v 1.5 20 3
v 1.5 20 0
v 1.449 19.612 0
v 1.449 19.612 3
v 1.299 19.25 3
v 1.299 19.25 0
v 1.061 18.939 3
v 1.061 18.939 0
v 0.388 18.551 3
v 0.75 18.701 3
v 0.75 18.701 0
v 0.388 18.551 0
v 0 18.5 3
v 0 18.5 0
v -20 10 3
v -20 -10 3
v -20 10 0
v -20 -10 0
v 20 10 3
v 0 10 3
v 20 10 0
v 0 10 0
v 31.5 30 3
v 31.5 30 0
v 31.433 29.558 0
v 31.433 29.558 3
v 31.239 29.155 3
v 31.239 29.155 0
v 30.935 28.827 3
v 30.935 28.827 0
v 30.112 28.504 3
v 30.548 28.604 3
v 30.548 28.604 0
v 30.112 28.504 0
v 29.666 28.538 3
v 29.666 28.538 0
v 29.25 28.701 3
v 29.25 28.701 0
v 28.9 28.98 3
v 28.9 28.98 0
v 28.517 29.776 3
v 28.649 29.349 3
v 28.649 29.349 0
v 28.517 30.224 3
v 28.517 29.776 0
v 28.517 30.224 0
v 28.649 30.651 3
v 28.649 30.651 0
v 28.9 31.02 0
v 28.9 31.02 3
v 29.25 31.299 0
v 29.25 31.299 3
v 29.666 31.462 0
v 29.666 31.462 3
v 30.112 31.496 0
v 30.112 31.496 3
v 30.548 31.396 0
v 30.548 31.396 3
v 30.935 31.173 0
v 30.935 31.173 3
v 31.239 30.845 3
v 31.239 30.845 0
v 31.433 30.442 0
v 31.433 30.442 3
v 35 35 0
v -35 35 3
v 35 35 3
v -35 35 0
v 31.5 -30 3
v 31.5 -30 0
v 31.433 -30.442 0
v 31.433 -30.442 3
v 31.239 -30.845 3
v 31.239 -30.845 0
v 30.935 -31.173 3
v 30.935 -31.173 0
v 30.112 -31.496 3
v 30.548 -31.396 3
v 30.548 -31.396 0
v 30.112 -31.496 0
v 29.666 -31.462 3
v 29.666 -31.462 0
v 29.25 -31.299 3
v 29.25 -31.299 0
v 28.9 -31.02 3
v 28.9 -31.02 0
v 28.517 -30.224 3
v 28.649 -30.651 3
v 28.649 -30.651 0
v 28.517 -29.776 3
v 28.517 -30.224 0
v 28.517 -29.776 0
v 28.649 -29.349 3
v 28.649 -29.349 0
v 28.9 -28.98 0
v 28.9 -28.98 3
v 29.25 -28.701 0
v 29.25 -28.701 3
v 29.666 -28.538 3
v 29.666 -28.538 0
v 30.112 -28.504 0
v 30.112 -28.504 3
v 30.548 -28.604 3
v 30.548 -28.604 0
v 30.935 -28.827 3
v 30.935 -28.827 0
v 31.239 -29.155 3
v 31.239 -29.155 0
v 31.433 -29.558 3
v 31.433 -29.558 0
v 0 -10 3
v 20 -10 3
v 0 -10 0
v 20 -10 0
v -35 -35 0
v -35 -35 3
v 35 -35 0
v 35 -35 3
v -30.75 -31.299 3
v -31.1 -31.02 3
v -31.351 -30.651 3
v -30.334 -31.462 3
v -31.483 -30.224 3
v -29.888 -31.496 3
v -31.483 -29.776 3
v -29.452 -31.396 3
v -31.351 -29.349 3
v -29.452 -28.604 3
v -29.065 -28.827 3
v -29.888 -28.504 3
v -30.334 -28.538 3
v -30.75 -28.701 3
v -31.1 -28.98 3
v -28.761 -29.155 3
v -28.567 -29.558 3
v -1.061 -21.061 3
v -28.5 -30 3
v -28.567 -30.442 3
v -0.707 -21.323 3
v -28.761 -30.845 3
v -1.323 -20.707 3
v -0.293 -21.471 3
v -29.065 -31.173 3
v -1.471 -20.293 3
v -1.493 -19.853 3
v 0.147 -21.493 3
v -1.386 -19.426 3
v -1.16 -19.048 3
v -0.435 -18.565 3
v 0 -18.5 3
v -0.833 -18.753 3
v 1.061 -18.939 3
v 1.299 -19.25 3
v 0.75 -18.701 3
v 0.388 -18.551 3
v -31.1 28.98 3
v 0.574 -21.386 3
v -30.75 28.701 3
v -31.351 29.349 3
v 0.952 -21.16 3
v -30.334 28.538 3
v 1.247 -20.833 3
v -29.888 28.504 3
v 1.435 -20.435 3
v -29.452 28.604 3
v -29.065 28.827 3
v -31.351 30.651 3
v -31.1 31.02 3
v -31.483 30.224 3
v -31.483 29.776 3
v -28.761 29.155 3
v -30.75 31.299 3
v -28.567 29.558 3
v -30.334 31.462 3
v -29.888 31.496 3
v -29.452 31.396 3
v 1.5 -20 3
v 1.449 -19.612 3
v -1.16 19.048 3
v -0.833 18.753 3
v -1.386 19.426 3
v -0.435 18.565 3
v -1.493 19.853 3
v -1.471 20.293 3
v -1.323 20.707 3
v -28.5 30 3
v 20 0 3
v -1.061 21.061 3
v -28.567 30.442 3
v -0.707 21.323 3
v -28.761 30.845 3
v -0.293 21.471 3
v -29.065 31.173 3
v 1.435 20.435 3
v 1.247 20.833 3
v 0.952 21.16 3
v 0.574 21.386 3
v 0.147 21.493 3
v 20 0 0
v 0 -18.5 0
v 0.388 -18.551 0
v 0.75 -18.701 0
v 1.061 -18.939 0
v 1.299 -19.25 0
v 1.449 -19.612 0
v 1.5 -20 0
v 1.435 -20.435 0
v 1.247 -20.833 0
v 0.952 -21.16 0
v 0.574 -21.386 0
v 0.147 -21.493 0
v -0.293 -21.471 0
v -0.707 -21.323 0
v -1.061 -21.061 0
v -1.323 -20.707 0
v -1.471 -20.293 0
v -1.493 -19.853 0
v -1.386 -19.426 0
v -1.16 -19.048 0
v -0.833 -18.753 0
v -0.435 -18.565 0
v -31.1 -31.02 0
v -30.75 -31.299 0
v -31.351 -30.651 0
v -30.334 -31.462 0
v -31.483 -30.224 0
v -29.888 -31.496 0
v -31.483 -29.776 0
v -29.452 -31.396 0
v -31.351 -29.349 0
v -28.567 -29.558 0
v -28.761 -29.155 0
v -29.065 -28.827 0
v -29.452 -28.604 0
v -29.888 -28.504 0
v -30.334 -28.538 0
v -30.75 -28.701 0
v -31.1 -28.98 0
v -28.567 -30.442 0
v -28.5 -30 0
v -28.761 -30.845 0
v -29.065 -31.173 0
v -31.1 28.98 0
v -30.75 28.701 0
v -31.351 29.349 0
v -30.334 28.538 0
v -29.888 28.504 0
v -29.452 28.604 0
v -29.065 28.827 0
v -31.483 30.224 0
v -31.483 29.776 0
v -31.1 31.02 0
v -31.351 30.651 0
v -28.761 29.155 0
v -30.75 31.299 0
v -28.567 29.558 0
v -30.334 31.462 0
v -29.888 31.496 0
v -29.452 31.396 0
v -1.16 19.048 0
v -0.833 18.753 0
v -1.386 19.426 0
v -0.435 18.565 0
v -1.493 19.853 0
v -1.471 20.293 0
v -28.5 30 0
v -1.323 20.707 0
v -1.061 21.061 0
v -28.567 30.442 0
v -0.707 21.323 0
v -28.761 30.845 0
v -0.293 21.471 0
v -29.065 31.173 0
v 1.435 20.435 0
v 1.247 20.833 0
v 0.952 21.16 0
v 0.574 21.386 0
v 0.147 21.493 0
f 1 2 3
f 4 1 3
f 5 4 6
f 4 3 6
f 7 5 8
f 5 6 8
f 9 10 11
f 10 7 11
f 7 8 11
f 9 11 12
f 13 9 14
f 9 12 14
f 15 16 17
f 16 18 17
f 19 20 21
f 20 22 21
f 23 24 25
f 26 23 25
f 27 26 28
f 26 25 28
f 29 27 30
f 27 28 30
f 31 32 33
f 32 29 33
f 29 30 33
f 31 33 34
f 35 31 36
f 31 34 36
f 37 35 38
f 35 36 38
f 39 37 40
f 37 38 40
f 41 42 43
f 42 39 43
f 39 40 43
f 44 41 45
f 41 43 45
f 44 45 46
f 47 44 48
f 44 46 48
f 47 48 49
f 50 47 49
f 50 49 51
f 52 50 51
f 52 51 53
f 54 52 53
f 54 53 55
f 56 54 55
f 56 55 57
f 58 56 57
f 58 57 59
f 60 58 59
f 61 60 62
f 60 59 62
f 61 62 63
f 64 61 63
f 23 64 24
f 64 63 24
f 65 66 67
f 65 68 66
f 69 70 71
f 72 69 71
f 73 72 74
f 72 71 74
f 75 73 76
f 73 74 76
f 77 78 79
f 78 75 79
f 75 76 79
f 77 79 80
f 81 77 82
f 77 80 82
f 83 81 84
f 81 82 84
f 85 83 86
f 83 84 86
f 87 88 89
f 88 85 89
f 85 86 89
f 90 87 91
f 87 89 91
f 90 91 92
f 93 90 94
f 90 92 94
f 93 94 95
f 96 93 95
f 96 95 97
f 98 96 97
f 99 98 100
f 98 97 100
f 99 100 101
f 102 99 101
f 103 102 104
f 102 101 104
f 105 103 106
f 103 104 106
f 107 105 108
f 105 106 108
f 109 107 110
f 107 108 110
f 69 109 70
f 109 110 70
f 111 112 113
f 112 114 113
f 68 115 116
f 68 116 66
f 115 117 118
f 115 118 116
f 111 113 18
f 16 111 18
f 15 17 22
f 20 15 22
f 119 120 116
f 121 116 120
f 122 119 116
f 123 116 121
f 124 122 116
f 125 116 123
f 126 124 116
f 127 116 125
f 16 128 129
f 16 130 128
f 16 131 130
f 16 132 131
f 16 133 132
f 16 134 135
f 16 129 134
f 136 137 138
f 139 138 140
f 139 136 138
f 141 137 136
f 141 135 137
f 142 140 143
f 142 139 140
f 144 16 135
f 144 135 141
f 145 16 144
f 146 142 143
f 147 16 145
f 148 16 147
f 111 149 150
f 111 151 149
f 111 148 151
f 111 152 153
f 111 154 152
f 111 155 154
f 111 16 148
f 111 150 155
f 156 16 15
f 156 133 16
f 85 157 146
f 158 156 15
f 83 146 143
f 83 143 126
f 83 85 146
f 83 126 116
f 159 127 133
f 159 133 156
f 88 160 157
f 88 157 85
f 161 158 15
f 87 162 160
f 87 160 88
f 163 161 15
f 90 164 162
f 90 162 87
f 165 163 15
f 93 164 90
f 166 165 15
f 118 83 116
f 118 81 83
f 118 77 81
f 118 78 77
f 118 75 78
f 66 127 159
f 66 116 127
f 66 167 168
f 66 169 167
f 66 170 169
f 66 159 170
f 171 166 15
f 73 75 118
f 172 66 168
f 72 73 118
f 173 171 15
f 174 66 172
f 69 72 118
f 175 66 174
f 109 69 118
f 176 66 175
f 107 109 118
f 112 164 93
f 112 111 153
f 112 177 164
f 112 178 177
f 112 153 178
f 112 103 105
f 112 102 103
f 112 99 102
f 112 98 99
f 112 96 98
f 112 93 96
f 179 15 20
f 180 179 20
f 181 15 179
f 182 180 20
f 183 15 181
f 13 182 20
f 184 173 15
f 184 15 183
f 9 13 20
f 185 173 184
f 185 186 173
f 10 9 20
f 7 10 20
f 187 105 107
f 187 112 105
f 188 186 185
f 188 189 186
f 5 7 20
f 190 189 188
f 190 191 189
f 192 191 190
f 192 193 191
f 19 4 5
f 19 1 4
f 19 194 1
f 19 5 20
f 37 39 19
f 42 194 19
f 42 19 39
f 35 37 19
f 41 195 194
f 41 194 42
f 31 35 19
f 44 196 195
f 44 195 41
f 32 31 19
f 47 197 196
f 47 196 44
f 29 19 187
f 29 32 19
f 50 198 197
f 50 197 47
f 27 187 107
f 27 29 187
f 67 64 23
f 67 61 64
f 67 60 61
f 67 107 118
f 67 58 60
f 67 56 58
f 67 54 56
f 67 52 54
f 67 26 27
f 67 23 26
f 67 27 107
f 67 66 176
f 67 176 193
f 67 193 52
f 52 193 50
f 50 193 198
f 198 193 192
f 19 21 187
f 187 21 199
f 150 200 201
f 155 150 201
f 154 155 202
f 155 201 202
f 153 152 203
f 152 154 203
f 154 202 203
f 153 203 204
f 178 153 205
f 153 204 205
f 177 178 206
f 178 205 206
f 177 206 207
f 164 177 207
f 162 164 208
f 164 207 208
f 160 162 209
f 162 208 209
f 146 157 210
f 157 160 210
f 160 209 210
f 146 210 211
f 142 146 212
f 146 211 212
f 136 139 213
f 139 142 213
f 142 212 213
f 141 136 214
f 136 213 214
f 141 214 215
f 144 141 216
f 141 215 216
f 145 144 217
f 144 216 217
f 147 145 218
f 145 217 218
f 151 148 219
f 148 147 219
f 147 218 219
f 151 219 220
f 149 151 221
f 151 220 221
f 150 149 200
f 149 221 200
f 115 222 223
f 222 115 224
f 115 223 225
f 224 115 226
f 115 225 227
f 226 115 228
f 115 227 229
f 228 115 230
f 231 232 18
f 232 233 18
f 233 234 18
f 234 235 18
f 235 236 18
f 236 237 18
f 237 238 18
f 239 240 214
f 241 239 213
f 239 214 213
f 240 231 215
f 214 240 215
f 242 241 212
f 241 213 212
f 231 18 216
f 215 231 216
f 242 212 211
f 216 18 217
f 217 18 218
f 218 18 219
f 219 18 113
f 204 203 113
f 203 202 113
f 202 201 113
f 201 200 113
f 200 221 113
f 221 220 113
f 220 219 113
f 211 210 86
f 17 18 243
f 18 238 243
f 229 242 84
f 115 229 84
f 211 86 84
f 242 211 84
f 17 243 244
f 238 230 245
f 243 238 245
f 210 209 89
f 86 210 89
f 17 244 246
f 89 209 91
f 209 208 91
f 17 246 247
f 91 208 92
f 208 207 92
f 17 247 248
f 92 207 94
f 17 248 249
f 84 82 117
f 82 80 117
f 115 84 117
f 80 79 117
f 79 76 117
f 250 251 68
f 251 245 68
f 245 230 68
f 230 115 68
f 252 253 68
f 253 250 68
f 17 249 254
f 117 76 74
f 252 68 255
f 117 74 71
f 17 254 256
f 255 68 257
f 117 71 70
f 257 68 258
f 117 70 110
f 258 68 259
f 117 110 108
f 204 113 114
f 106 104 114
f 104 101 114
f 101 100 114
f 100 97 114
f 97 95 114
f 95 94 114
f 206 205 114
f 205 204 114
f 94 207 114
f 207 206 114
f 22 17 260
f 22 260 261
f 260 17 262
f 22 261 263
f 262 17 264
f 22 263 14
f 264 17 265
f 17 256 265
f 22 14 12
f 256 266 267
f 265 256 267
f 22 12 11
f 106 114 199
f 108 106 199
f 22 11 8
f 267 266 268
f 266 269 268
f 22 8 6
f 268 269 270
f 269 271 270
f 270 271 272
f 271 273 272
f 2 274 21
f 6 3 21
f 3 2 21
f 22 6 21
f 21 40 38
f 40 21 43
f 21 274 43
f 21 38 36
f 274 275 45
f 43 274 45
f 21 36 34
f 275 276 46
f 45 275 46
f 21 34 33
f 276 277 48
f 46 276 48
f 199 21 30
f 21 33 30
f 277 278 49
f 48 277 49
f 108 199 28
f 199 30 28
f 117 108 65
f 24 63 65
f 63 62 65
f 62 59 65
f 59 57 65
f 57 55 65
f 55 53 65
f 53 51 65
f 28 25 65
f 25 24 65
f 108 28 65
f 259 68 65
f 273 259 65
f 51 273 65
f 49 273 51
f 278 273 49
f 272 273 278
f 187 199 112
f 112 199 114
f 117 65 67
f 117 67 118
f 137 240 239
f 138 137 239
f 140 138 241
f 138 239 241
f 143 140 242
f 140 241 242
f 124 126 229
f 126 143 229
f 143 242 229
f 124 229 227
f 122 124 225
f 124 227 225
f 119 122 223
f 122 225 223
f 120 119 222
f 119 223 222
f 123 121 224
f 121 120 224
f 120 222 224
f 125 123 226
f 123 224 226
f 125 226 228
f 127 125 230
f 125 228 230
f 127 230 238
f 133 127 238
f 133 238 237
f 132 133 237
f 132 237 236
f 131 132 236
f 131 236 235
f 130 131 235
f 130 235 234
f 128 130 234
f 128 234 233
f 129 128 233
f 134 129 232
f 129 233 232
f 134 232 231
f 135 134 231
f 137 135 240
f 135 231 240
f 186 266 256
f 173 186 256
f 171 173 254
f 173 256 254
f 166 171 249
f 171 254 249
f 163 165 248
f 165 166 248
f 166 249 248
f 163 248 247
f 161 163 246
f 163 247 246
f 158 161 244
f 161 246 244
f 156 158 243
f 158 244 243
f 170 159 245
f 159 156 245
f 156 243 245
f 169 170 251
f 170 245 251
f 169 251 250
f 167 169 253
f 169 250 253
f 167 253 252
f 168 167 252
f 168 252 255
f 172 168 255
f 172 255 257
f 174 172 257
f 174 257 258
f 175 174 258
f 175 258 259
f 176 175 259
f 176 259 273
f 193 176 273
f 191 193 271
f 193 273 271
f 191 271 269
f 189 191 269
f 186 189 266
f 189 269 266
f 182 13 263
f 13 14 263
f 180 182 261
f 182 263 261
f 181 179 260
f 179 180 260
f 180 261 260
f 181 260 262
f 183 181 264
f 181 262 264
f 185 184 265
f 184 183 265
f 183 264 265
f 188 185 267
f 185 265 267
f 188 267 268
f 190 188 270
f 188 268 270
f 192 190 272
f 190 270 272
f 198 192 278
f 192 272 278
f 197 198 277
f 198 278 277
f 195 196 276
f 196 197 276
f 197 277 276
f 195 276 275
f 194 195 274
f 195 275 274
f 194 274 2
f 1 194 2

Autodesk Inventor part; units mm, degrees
ref_plane "YZ Plane" through (0, 0, 0) normal (1, 0, 0) x (0, 1, 0)
ref_plane "XZ Plane" through (0, 0, 0) normal (0, 1, 0) x (-1, 0, 0)
ref_plane "XY Plane" through (0, 0, 0) normal (0, 0, 1) x (1, 0, 0)
sketch "Sketch1" plane through (0, 0, 0) normal (0, 0, 1) x (1, 0, 0)
  line L0 (-20, 10) -> (20, 10)
  line L1 (20, 10) -> (20, -10)
  line L2 (20, -10) -> (-20, -10)
  line L3 (-20, -10) -> (-20, 10)
  line L4 (-20, 10) -> (20, -10) construction
  line L5 (20, 10) -> (-20, -10) construction
  line L6 (20, 0) -> (30, 0)
  line L7 (35, -35) -> (-35, -35)
  line L8 (-35, -35) -> (-35, 35)
  line L9 (-35, 35) -> (35, 35)
  line L10 (35, 35) -> (35, -35)
  line L11 (35, -35) -> (-35, 35) construction
  line L12 (-35, -35) -> (35, 35) construction
  line L13 (30, -30) -> (-30, 30) construction
  line L14 (-30, -30) -> (30, 30) construction
  circle A0 centre (-30, 30) radius 1.5
  circle A1 centre (30, 30) radius 1.5
  circle A2 centre (-30, -30) radius 1.5
  circle A3 centre (30, -30) radius 1.5
  line L15 (0, 10) -> (0, 20)
  line L16 (0, -10) -> (0, -20)
  circle A4 centre (0, 20) radius 1.5
  circle A5 centre (0, -20) radius 1.5
  point P0 (0, 0)
  dimension "d0" = 40
  dimension "d1" = 20
  dimension "d2" = 10
  dimension "d3" = 70
  dimension "d4" = 70
  dimension "d9" = 3
  dimension "d10" = 3
  dimension "d11" = 3
  dimension "d12" = 3
  dimension "d15" = 10
  dimension "d16" = 10
  dimension "d17" = 3
  dimension "d18" = 3
extrude "Extrusion3" add sketch "Sketch1" along normal blind 3
properties part number "Servo Holder TOP"
